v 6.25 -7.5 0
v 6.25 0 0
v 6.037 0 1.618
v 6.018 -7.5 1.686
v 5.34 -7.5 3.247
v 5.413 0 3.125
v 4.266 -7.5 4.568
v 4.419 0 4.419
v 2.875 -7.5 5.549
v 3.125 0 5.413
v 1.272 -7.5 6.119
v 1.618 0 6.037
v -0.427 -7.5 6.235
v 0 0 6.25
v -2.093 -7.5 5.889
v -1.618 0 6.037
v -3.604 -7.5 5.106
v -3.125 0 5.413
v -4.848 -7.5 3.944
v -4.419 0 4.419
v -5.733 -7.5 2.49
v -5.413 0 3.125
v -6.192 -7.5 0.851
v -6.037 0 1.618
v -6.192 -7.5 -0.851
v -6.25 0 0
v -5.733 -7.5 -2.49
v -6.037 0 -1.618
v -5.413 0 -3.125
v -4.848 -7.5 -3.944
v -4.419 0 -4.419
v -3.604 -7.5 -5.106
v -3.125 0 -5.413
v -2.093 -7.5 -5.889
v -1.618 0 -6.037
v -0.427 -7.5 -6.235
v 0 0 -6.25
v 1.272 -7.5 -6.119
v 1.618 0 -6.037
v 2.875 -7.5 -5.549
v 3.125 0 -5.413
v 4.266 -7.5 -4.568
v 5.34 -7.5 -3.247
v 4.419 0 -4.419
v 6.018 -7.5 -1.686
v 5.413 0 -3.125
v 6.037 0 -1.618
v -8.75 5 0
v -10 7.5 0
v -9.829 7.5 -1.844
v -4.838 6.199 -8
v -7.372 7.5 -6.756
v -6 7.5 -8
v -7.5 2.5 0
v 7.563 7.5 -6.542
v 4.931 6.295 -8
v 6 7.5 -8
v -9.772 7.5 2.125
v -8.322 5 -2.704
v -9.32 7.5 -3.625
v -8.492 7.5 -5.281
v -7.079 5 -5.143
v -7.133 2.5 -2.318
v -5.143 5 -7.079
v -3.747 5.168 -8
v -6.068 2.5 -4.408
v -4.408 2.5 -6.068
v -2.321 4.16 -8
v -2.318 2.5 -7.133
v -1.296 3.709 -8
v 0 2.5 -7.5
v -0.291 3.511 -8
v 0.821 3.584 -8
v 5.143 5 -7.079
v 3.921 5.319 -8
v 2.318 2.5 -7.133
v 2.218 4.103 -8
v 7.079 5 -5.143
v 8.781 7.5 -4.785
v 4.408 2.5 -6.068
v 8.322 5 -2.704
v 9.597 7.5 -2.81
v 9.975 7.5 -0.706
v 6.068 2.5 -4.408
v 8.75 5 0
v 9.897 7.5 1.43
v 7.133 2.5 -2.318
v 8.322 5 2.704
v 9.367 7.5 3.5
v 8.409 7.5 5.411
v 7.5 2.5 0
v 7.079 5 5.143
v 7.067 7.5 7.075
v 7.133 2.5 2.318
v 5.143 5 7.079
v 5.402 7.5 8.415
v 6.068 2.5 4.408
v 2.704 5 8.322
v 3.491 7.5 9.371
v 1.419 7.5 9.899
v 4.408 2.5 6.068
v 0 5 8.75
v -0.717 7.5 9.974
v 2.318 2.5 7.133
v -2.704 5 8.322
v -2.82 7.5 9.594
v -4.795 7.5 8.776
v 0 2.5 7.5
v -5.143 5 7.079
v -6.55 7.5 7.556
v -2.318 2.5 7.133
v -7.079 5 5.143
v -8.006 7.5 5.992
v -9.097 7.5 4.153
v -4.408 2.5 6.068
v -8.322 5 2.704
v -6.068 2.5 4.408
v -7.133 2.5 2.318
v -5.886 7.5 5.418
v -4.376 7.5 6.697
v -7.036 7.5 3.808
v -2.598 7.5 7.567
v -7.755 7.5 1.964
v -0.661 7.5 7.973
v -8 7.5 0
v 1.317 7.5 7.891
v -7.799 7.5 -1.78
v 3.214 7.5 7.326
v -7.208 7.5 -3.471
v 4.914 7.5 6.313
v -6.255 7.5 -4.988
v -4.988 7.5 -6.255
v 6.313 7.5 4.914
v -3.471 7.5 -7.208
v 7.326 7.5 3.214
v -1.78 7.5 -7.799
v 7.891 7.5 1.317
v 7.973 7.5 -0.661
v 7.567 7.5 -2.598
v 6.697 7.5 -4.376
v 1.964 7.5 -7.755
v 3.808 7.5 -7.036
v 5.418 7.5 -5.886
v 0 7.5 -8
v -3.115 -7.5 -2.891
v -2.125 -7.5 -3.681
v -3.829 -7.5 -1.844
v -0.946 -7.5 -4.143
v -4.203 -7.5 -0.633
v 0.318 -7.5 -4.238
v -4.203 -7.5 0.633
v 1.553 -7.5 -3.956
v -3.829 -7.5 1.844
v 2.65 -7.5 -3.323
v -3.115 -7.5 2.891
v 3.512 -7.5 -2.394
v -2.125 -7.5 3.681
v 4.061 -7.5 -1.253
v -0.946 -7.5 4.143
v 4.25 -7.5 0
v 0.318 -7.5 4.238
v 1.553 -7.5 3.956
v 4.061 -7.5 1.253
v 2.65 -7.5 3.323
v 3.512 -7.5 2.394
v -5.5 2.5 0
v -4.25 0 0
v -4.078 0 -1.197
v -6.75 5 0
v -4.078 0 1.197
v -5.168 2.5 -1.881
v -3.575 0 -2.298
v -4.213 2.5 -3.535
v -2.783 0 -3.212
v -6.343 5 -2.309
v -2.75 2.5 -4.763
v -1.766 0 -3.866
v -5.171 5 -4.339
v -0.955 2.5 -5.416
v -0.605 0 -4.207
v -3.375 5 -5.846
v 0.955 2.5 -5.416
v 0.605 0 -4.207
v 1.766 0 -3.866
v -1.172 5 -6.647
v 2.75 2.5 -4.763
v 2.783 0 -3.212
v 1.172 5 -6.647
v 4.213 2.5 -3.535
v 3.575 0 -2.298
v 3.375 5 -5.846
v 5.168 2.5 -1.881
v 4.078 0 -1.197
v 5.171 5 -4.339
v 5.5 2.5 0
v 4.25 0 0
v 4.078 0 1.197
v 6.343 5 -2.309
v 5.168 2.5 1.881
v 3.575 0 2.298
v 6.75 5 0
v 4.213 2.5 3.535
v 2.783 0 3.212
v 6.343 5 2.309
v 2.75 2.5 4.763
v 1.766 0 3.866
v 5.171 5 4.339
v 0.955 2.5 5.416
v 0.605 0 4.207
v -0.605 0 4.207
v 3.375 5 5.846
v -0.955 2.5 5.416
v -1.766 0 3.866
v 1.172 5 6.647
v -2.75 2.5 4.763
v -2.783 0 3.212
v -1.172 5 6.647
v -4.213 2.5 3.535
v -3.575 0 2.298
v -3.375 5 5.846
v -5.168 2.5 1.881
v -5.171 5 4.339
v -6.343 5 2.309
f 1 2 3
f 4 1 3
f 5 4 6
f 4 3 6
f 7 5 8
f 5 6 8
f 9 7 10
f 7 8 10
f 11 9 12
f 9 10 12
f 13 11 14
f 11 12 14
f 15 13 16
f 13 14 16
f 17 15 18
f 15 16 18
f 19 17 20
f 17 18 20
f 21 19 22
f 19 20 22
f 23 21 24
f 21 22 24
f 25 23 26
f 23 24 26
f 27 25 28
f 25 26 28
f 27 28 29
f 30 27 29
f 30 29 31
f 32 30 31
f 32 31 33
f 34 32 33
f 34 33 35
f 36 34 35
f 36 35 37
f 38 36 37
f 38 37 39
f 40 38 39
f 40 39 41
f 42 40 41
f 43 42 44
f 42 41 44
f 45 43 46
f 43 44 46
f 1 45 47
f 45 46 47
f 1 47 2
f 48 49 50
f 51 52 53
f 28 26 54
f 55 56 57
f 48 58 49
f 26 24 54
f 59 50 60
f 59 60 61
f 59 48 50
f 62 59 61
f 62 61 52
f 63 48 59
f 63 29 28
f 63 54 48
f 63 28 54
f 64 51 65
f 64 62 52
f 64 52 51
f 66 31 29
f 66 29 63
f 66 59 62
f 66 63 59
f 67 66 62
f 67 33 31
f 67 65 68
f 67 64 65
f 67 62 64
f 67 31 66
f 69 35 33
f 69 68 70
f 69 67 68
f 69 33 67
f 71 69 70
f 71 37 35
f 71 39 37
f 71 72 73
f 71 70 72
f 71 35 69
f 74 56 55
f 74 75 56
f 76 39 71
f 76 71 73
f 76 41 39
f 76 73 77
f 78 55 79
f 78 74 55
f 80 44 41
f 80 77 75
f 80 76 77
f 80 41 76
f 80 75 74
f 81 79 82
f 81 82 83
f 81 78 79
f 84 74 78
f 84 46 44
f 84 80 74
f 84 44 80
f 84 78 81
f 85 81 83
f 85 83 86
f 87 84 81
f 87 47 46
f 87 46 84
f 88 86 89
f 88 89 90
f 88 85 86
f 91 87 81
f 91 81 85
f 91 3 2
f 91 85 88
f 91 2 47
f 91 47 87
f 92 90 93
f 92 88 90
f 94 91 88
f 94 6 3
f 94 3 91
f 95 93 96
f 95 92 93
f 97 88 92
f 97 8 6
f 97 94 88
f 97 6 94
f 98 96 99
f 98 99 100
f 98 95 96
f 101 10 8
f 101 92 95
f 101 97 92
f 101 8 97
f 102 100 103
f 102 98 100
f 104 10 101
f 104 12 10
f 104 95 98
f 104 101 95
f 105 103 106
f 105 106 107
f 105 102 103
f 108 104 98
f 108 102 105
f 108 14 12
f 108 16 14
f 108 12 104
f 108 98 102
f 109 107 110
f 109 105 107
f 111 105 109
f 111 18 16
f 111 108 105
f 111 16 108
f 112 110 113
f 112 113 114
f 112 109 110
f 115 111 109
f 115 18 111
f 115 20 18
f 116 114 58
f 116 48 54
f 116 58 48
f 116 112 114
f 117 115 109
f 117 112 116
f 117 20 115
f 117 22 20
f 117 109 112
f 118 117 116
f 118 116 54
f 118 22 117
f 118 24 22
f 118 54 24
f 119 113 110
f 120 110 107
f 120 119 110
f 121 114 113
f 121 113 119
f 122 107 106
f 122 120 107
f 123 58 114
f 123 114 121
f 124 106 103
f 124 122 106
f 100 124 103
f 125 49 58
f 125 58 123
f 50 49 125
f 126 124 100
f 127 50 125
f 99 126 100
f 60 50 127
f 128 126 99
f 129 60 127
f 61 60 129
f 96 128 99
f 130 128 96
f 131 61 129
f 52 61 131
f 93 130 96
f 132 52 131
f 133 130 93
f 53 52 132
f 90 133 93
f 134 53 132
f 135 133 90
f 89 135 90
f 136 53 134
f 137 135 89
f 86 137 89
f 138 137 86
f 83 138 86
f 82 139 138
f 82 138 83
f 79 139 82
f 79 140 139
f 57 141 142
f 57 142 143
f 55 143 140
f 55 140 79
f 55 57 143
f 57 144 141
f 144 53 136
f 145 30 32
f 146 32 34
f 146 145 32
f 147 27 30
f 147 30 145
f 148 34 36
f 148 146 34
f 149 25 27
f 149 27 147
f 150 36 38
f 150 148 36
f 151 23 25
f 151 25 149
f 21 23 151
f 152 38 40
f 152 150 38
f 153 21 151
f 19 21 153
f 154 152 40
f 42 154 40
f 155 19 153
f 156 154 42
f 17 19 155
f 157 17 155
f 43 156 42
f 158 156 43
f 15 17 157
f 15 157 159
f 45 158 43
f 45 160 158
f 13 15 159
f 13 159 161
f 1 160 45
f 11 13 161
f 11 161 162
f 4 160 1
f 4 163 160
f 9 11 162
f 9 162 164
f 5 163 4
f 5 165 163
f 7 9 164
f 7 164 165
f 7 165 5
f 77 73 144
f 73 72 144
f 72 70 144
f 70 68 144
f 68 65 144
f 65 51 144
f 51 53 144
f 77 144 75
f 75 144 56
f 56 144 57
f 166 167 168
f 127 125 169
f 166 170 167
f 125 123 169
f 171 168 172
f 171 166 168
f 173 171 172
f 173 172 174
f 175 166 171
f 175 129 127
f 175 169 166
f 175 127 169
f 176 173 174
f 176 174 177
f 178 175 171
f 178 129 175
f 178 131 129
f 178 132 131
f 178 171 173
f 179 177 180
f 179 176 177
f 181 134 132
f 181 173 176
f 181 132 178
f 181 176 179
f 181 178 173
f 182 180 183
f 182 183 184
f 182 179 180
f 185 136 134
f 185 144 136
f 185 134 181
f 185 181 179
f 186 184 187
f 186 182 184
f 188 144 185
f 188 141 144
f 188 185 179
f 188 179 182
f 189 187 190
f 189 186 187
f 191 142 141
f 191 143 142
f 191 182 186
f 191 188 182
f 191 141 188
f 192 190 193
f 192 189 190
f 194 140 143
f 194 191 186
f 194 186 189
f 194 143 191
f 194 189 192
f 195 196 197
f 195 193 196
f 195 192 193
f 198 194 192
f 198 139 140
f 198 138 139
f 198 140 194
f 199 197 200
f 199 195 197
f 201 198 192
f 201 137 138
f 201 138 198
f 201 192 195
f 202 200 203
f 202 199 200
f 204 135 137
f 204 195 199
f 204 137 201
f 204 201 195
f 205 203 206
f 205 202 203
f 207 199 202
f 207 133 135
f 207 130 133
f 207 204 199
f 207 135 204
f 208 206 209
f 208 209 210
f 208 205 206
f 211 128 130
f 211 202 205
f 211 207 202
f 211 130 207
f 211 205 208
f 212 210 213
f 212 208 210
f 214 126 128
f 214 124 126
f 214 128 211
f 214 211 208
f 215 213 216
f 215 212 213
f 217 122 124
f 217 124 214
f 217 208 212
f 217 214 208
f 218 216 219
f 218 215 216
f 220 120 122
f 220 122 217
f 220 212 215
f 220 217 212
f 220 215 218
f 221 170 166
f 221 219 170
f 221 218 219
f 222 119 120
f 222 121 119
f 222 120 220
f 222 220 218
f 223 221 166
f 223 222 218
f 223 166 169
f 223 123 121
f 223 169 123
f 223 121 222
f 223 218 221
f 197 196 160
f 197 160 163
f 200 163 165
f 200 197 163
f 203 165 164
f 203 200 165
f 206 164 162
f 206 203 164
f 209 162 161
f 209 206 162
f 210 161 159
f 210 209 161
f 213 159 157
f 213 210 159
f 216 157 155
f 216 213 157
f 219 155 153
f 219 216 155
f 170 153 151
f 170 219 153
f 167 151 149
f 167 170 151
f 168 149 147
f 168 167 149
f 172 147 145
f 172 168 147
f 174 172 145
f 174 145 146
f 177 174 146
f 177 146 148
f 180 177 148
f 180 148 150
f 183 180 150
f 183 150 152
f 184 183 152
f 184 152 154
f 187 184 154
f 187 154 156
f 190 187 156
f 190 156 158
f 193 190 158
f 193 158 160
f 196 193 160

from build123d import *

# Parameters (mm, degrees)
CROQUIS3_R              = 6.25
CROQUIS3_R_2            = 4.25
SALIENTE_EXTRUIR1_DEPTH = 7.5
CORTAR_EXTRUIR1_DEPTH   = 10


with BuildPart() as part:
    # Croquis2 → Revolución1 (revolve)
    with BuildSketch(Plane.XY):
        Polygon((-4.25, 0), (-8, 7.5), (-10, 7.5), (-6.25, 0), align=None)
    revolve(axis=Axis((0, 7.5, 0), (0, -1, 0)))

    # Croquis3 → Saliente-Extruir1 (add)
    with BuildSketch(Plane.XZ):
        Circle(CROQUIS3_R)
        Circle(CROQUIS3_R_2, mode=Mode.SUBTRACT)
    extrude(amount=SALIENTE_EXTRUIR1_DEPTH)

    # Croquis4 → Cortar-Extruir1 (cut)
    with BuildSketch(Plane(origin=(0, 7.5, 0), x_dir=(1, 0, 0), z_dir=(0, 1, 0))):
        Polygon((-7.816541924, 8), (7.816541924, 8), (0, 11.458627945), align=None)
    extrude(amount=-CORTAR_EXTRUIR1_DEPTH, mode=Mode.SUBTRACT)


solid = part.part
